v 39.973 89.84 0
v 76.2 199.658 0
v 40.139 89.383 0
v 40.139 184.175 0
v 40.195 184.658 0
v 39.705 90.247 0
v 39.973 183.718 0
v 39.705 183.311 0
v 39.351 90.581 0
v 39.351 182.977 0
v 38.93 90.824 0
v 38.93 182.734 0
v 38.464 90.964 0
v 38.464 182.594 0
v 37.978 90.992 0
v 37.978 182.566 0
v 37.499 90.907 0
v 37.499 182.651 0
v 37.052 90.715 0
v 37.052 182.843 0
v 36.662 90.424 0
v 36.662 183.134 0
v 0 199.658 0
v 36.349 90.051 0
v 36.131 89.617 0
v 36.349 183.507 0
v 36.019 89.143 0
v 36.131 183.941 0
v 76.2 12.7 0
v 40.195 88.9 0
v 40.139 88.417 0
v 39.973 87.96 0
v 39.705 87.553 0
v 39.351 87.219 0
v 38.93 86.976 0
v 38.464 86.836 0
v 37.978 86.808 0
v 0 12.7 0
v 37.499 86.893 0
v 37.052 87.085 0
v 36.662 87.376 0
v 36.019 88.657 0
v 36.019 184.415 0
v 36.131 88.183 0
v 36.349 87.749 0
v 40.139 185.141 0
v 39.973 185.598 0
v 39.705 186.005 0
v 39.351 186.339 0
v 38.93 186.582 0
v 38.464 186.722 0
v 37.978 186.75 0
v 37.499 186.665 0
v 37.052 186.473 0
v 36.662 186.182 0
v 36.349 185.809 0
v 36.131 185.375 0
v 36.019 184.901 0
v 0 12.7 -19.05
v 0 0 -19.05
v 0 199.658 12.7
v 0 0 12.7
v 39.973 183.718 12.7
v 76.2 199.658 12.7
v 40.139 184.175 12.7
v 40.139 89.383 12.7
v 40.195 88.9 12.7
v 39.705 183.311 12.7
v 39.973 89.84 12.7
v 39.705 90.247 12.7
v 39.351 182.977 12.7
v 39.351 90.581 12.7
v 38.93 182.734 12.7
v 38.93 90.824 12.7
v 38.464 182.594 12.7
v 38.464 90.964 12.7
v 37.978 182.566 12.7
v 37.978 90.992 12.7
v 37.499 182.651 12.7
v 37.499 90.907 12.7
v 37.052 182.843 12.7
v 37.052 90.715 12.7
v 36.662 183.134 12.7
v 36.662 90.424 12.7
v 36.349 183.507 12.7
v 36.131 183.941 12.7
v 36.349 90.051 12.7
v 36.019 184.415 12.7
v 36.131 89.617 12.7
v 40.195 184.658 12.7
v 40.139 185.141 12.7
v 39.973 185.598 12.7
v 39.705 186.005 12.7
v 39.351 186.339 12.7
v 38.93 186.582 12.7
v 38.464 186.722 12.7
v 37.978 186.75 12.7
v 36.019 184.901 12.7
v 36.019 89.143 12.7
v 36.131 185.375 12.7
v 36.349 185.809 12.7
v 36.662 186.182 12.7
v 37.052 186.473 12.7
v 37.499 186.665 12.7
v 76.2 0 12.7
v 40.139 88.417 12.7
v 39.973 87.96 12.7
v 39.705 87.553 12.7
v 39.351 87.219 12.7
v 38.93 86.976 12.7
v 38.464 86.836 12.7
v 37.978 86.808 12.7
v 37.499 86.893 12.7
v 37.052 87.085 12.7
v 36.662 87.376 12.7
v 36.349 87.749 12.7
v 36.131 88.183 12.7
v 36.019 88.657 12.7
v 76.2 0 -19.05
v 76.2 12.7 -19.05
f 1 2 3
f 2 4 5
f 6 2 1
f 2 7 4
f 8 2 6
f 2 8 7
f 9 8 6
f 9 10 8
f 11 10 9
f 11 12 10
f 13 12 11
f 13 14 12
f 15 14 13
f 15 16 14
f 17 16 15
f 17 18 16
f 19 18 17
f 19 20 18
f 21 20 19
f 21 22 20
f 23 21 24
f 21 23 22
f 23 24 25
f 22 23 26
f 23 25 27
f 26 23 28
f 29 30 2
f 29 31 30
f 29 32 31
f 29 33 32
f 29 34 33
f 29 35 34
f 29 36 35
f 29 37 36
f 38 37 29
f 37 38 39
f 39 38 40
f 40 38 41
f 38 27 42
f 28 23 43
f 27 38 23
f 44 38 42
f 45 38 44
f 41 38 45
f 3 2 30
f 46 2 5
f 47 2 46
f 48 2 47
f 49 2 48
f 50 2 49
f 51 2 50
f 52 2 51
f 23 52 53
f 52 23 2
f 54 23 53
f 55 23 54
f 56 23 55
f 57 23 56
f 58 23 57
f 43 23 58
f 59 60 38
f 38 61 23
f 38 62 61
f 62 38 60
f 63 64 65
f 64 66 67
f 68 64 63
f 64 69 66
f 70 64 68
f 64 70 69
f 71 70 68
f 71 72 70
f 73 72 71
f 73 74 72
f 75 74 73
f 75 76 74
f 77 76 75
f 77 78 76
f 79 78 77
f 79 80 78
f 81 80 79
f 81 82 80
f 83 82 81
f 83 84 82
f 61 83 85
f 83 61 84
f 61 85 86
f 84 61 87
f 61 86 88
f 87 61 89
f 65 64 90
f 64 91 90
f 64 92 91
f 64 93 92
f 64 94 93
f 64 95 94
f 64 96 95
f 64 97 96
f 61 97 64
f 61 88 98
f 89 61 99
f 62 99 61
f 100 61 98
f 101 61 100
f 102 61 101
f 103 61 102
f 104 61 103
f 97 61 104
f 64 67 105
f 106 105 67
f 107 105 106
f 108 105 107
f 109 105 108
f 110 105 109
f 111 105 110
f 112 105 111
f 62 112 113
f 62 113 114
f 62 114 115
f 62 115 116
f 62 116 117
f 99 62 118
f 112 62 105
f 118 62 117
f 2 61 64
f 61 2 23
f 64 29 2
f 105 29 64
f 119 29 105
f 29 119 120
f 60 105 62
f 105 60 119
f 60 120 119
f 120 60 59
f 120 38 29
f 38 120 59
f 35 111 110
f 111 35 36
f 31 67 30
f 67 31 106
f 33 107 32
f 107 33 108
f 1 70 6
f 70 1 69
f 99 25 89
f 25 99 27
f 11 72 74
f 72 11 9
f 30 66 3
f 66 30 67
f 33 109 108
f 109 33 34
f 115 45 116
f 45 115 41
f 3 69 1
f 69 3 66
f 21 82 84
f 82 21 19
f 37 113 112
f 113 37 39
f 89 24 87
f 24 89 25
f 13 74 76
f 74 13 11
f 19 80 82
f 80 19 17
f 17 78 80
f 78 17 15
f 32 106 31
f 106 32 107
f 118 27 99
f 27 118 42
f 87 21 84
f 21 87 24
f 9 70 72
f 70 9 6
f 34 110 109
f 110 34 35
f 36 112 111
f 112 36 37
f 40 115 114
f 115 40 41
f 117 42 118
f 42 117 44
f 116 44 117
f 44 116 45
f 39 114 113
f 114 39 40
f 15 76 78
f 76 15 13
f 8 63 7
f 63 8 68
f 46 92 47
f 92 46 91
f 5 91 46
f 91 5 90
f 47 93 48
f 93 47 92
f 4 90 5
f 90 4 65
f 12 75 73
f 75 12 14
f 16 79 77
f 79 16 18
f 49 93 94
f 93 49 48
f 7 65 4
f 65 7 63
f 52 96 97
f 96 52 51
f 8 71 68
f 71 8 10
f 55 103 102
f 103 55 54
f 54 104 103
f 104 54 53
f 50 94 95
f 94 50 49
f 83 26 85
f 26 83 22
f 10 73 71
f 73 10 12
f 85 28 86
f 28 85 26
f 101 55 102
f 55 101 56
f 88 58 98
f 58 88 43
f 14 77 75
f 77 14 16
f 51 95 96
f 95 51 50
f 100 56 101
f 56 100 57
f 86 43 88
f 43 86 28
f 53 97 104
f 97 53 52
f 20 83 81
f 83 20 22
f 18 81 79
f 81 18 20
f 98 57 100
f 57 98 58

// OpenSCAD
$fa=6*1;
$fs=0.5*1;

// Stile Width (in inches)
x_in=3.0;

// Bottom Hole (in inches)
y_in=3.0;

// Thickness (in inches)
z_in=0.5;

// Hole Diameter (in inches)
d_in=0.165;

// Center to Center in inches
CTC_in=3.77;

mm_per_inch=25.4*1;
x_mm = x_in*mm_per_inch; 
y_mm = y_in*mm_per_inch; 
z_mm = z_in*mm_per_inch; 
d_mm = d_in*mm_per_inch; 
CTC_mm = CTC_in*mm_per_inch; 
//total_height=(CTC+1+z_in)*mm_per_inch;
difference()
{
    union() {
    // build main plate
    linear_extrude(z_mm) 
    square([x_mm, (z_mm+y_mm+CTC_mm+15)]);


    translate([0,0,-0.75*mm_per_inch]) 
    linear_extrude(0.75*mm_per_inch) square([x_mm, (z_mm)]);
    }

    // Drill bottom hole
    translate ([(x_mm/2), (z_mm+y_mm), 0])
    cylinder(h=z_mm*4, d=d_mm, center=true);


    // Drill top hole
    translate ([(x_mm/2), (z_mm+y_mm+CTC_mm), 0])
    cylinder(h=z_mm*4, d=d_mm, center=true);
}
